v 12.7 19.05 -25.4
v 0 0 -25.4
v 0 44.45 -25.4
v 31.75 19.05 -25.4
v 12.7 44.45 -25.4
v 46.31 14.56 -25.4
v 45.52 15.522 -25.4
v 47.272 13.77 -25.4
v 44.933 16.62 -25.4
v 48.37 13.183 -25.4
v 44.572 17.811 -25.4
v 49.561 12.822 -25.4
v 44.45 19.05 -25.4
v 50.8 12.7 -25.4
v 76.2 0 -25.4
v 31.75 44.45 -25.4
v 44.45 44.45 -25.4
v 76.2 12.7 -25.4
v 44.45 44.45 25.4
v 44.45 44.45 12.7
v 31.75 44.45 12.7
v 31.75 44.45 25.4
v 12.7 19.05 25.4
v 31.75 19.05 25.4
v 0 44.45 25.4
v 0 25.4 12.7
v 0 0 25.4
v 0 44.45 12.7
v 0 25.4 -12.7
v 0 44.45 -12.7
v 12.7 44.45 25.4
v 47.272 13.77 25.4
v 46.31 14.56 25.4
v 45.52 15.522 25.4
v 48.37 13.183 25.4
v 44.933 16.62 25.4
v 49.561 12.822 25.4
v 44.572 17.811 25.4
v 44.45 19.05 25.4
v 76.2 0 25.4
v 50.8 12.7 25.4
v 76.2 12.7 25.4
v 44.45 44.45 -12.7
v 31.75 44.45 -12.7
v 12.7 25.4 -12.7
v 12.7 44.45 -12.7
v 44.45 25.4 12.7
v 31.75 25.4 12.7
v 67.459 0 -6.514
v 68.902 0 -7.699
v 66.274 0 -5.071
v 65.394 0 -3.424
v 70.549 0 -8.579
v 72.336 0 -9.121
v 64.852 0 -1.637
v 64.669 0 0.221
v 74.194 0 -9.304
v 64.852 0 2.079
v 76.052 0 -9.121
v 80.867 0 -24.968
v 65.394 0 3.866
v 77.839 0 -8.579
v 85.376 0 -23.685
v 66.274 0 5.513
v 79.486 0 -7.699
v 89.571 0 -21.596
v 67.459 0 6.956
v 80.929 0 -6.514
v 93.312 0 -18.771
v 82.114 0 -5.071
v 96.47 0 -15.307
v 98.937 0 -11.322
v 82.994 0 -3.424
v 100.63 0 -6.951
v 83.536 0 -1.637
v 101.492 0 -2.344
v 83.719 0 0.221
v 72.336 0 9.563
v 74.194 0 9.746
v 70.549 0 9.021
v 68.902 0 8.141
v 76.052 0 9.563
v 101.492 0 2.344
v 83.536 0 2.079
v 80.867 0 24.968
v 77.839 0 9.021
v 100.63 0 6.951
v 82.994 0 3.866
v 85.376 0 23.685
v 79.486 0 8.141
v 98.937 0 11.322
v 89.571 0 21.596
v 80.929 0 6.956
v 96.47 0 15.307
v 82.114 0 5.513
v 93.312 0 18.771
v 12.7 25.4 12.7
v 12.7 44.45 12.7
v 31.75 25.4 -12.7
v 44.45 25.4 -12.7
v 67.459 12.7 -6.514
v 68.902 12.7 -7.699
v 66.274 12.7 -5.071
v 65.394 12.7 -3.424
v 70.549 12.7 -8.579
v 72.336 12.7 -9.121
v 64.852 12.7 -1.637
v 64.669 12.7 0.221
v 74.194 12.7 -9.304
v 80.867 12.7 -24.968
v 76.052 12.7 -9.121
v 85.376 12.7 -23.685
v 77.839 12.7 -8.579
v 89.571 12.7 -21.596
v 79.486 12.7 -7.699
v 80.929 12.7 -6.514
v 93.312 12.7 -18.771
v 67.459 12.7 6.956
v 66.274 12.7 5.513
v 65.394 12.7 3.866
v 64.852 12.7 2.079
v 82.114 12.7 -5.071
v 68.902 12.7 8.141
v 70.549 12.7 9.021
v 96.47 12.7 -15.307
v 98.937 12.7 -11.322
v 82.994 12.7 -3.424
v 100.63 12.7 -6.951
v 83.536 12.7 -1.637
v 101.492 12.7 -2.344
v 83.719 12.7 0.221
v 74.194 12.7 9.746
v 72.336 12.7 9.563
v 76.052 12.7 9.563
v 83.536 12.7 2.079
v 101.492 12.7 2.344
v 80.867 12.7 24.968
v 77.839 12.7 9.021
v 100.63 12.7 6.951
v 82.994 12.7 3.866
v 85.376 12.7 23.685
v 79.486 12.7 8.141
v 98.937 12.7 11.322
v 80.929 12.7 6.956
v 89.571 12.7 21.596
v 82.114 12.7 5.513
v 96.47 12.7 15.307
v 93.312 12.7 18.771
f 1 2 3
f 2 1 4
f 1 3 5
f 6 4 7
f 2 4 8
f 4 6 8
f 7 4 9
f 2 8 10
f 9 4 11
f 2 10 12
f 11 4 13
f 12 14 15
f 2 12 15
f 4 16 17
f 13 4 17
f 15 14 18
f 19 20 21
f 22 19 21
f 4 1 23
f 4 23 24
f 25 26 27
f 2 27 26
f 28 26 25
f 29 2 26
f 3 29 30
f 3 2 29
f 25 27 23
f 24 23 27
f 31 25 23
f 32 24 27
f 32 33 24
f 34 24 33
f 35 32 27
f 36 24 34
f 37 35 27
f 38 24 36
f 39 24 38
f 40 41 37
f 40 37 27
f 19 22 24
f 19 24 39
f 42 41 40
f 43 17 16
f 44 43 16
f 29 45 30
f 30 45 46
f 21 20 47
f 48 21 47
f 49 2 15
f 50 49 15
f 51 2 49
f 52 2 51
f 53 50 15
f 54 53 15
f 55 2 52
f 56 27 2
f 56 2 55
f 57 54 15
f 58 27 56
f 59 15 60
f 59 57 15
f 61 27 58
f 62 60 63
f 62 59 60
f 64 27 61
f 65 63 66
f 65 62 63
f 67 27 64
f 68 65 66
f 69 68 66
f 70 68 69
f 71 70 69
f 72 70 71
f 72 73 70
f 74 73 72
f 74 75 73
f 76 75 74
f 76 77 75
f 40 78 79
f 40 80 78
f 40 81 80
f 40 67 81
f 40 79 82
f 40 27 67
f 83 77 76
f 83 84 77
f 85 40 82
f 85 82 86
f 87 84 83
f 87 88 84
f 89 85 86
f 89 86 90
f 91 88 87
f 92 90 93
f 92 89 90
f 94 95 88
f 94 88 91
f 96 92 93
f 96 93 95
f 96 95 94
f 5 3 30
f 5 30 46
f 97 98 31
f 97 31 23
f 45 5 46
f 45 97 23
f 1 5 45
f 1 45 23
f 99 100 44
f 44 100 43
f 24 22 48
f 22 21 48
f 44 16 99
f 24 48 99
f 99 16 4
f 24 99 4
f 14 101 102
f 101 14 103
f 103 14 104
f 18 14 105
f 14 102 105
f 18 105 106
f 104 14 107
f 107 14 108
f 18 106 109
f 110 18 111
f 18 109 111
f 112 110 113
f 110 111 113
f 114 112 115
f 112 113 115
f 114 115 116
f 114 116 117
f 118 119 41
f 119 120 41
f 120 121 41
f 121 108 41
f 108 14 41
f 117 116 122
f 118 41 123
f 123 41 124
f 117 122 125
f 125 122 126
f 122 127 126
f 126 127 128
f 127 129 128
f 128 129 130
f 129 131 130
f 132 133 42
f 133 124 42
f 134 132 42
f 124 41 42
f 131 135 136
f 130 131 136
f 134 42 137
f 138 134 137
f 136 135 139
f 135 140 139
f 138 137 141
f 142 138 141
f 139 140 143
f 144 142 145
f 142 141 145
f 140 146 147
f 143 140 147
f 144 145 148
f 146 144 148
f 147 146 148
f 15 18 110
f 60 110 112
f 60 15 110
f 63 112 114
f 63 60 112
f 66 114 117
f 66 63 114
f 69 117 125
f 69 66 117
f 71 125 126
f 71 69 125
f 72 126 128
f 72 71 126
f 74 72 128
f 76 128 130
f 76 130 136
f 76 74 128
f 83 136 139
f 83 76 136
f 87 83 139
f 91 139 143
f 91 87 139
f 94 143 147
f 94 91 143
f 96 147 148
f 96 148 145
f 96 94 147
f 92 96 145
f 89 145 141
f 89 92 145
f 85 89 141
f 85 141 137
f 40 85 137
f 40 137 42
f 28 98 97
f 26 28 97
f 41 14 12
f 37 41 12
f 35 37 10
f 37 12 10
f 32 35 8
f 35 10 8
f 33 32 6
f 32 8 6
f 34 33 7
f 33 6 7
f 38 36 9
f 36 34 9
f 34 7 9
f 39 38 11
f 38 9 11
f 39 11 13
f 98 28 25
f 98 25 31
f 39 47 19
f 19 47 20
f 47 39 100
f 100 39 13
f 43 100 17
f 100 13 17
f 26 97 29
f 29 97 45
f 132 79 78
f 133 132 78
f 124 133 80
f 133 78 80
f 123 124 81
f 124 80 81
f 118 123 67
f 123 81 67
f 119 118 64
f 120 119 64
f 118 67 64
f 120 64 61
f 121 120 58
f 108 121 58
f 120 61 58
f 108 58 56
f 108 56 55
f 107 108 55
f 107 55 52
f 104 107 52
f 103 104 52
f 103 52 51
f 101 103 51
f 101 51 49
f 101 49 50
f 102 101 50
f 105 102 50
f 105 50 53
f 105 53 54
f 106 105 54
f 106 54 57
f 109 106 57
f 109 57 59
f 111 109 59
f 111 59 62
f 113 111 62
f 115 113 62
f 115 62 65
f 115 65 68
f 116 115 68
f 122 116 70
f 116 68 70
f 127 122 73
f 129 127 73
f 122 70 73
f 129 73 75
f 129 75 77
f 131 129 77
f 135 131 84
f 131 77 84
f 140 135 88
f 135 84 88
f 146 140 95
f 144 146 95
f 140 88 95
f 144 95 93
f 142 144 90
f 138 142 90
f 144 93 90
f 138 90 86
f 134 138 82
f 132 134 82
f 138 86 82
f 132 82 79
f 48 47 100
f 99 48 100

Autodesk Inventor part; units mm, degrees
ref_plane "YZ Plane" through (0, 0, 0) normal (1, 0, 0) x (0, 1, 0)
ref_plane "XZ Plane" through (0, 0, 0) normal (0, 1, 0) x (-1, 0, 0)
ref_plane "XY Plane" through (0, 0, 0) normal (0, 0, 1) x (1, 0, 0)
sketch "Sketch1" plane through (0, 0, 0) normal (0, 0, 1) x (1, 0, 0)
  line L0 (0, 0) -> (0, 44.45)
  line L1 (0, 44.45) -> (12.7, 44.45)
  line L2 (0, 0) -> (76.2, 0)
  line L3 (76.2, 0) -> (76.2, 12.7)
  line L4 (76.2, 12.7) -> (50.8, 12.7)
  line L5 (44.45, 19.05) -> (44.45, 44.45)
  line L6 (44.45, 44.45) -> (31.75, 44.45)
  line L7 (31.75, 44.45) -> (31.75, 19.05)
  line L8 (12.7, 44.45) -> (12.7, 19.05)
  line L9 (12.7, 19.05) -> (31.75, 19.05)
  arc A0 (44.45, 19.05) -> (50.8, 12.7) centre (50.8, 19.05) ccw
  point P0 (44.45, 12.7)
  dimension "d0" = 44.45
  dimension "d1" = 12.7
  dimension "d2" = 76.2
  dimension "d3" = 12.7
  dimension "d4" = 31.75
  dimension "d5" = 31.75
  dimension "d6" = 12.7
  dimension "d7" = 25.4
  dimension "d8" = 25.4
  dimension "d9" = 19.05
  dimension "d26" = 6.35
extrude "Base" add sketch "Sketch1" along normal mid plane 50.8
sketch "Sketch2" plane through (0, 0, 25.4) normal (0, -1, 0) x (1, 0, 0)
  line L0 (76.2, -50.8) -> (76.2, 0) projected
  circle A0 centre (76.2, -25.4) radius 25.4
  point P0 (0, -25.4)
  point P1 (76.2, 0)
extrude "Circle_EXT" add sketch "Sketch2" against normal up to surface (12.7 mm away) contours L0 A0 picked at (83.8282, -21.7265)
sketch "Sketch3" plane through (44.45, 12.7, 25.4) normal (0, 1, 0) x (1, 0, 0)
  point P0 (-44.45, 25.4)
  point P1 (29.7441, 25.1789)
hole "Hole1" at (74.1941, 12.7, 0.2211) direction (0, -1, 0) diameter 19.05 end through all
sketch "Sketch4" plane through (44.45, 12.7, 25.4) normal (1, 0, 0) x (0, 0, -1)
  line L0 (0, 31.75) -> (0, 6.35) projected
  line L1 (0, 31.75) -> (50.8, 31.75) projected
  line L2 (12.7, 31.75) -> (12.7, 12.7)
  line L3 (12.7, 12.7) -> (38.1, 12.7)
  line L4 (38.1, 12.7) -> (38.1, 31.75)
  point P0 (25.4, -12.7)
  dimension "d22" = 19.05
  dimension "d23" = 25.4
extrude "RECT_CUT" cut sketch "Sketch4" against normal through all
properties part number "Saddle Bracket" material "Iron, Cast"
